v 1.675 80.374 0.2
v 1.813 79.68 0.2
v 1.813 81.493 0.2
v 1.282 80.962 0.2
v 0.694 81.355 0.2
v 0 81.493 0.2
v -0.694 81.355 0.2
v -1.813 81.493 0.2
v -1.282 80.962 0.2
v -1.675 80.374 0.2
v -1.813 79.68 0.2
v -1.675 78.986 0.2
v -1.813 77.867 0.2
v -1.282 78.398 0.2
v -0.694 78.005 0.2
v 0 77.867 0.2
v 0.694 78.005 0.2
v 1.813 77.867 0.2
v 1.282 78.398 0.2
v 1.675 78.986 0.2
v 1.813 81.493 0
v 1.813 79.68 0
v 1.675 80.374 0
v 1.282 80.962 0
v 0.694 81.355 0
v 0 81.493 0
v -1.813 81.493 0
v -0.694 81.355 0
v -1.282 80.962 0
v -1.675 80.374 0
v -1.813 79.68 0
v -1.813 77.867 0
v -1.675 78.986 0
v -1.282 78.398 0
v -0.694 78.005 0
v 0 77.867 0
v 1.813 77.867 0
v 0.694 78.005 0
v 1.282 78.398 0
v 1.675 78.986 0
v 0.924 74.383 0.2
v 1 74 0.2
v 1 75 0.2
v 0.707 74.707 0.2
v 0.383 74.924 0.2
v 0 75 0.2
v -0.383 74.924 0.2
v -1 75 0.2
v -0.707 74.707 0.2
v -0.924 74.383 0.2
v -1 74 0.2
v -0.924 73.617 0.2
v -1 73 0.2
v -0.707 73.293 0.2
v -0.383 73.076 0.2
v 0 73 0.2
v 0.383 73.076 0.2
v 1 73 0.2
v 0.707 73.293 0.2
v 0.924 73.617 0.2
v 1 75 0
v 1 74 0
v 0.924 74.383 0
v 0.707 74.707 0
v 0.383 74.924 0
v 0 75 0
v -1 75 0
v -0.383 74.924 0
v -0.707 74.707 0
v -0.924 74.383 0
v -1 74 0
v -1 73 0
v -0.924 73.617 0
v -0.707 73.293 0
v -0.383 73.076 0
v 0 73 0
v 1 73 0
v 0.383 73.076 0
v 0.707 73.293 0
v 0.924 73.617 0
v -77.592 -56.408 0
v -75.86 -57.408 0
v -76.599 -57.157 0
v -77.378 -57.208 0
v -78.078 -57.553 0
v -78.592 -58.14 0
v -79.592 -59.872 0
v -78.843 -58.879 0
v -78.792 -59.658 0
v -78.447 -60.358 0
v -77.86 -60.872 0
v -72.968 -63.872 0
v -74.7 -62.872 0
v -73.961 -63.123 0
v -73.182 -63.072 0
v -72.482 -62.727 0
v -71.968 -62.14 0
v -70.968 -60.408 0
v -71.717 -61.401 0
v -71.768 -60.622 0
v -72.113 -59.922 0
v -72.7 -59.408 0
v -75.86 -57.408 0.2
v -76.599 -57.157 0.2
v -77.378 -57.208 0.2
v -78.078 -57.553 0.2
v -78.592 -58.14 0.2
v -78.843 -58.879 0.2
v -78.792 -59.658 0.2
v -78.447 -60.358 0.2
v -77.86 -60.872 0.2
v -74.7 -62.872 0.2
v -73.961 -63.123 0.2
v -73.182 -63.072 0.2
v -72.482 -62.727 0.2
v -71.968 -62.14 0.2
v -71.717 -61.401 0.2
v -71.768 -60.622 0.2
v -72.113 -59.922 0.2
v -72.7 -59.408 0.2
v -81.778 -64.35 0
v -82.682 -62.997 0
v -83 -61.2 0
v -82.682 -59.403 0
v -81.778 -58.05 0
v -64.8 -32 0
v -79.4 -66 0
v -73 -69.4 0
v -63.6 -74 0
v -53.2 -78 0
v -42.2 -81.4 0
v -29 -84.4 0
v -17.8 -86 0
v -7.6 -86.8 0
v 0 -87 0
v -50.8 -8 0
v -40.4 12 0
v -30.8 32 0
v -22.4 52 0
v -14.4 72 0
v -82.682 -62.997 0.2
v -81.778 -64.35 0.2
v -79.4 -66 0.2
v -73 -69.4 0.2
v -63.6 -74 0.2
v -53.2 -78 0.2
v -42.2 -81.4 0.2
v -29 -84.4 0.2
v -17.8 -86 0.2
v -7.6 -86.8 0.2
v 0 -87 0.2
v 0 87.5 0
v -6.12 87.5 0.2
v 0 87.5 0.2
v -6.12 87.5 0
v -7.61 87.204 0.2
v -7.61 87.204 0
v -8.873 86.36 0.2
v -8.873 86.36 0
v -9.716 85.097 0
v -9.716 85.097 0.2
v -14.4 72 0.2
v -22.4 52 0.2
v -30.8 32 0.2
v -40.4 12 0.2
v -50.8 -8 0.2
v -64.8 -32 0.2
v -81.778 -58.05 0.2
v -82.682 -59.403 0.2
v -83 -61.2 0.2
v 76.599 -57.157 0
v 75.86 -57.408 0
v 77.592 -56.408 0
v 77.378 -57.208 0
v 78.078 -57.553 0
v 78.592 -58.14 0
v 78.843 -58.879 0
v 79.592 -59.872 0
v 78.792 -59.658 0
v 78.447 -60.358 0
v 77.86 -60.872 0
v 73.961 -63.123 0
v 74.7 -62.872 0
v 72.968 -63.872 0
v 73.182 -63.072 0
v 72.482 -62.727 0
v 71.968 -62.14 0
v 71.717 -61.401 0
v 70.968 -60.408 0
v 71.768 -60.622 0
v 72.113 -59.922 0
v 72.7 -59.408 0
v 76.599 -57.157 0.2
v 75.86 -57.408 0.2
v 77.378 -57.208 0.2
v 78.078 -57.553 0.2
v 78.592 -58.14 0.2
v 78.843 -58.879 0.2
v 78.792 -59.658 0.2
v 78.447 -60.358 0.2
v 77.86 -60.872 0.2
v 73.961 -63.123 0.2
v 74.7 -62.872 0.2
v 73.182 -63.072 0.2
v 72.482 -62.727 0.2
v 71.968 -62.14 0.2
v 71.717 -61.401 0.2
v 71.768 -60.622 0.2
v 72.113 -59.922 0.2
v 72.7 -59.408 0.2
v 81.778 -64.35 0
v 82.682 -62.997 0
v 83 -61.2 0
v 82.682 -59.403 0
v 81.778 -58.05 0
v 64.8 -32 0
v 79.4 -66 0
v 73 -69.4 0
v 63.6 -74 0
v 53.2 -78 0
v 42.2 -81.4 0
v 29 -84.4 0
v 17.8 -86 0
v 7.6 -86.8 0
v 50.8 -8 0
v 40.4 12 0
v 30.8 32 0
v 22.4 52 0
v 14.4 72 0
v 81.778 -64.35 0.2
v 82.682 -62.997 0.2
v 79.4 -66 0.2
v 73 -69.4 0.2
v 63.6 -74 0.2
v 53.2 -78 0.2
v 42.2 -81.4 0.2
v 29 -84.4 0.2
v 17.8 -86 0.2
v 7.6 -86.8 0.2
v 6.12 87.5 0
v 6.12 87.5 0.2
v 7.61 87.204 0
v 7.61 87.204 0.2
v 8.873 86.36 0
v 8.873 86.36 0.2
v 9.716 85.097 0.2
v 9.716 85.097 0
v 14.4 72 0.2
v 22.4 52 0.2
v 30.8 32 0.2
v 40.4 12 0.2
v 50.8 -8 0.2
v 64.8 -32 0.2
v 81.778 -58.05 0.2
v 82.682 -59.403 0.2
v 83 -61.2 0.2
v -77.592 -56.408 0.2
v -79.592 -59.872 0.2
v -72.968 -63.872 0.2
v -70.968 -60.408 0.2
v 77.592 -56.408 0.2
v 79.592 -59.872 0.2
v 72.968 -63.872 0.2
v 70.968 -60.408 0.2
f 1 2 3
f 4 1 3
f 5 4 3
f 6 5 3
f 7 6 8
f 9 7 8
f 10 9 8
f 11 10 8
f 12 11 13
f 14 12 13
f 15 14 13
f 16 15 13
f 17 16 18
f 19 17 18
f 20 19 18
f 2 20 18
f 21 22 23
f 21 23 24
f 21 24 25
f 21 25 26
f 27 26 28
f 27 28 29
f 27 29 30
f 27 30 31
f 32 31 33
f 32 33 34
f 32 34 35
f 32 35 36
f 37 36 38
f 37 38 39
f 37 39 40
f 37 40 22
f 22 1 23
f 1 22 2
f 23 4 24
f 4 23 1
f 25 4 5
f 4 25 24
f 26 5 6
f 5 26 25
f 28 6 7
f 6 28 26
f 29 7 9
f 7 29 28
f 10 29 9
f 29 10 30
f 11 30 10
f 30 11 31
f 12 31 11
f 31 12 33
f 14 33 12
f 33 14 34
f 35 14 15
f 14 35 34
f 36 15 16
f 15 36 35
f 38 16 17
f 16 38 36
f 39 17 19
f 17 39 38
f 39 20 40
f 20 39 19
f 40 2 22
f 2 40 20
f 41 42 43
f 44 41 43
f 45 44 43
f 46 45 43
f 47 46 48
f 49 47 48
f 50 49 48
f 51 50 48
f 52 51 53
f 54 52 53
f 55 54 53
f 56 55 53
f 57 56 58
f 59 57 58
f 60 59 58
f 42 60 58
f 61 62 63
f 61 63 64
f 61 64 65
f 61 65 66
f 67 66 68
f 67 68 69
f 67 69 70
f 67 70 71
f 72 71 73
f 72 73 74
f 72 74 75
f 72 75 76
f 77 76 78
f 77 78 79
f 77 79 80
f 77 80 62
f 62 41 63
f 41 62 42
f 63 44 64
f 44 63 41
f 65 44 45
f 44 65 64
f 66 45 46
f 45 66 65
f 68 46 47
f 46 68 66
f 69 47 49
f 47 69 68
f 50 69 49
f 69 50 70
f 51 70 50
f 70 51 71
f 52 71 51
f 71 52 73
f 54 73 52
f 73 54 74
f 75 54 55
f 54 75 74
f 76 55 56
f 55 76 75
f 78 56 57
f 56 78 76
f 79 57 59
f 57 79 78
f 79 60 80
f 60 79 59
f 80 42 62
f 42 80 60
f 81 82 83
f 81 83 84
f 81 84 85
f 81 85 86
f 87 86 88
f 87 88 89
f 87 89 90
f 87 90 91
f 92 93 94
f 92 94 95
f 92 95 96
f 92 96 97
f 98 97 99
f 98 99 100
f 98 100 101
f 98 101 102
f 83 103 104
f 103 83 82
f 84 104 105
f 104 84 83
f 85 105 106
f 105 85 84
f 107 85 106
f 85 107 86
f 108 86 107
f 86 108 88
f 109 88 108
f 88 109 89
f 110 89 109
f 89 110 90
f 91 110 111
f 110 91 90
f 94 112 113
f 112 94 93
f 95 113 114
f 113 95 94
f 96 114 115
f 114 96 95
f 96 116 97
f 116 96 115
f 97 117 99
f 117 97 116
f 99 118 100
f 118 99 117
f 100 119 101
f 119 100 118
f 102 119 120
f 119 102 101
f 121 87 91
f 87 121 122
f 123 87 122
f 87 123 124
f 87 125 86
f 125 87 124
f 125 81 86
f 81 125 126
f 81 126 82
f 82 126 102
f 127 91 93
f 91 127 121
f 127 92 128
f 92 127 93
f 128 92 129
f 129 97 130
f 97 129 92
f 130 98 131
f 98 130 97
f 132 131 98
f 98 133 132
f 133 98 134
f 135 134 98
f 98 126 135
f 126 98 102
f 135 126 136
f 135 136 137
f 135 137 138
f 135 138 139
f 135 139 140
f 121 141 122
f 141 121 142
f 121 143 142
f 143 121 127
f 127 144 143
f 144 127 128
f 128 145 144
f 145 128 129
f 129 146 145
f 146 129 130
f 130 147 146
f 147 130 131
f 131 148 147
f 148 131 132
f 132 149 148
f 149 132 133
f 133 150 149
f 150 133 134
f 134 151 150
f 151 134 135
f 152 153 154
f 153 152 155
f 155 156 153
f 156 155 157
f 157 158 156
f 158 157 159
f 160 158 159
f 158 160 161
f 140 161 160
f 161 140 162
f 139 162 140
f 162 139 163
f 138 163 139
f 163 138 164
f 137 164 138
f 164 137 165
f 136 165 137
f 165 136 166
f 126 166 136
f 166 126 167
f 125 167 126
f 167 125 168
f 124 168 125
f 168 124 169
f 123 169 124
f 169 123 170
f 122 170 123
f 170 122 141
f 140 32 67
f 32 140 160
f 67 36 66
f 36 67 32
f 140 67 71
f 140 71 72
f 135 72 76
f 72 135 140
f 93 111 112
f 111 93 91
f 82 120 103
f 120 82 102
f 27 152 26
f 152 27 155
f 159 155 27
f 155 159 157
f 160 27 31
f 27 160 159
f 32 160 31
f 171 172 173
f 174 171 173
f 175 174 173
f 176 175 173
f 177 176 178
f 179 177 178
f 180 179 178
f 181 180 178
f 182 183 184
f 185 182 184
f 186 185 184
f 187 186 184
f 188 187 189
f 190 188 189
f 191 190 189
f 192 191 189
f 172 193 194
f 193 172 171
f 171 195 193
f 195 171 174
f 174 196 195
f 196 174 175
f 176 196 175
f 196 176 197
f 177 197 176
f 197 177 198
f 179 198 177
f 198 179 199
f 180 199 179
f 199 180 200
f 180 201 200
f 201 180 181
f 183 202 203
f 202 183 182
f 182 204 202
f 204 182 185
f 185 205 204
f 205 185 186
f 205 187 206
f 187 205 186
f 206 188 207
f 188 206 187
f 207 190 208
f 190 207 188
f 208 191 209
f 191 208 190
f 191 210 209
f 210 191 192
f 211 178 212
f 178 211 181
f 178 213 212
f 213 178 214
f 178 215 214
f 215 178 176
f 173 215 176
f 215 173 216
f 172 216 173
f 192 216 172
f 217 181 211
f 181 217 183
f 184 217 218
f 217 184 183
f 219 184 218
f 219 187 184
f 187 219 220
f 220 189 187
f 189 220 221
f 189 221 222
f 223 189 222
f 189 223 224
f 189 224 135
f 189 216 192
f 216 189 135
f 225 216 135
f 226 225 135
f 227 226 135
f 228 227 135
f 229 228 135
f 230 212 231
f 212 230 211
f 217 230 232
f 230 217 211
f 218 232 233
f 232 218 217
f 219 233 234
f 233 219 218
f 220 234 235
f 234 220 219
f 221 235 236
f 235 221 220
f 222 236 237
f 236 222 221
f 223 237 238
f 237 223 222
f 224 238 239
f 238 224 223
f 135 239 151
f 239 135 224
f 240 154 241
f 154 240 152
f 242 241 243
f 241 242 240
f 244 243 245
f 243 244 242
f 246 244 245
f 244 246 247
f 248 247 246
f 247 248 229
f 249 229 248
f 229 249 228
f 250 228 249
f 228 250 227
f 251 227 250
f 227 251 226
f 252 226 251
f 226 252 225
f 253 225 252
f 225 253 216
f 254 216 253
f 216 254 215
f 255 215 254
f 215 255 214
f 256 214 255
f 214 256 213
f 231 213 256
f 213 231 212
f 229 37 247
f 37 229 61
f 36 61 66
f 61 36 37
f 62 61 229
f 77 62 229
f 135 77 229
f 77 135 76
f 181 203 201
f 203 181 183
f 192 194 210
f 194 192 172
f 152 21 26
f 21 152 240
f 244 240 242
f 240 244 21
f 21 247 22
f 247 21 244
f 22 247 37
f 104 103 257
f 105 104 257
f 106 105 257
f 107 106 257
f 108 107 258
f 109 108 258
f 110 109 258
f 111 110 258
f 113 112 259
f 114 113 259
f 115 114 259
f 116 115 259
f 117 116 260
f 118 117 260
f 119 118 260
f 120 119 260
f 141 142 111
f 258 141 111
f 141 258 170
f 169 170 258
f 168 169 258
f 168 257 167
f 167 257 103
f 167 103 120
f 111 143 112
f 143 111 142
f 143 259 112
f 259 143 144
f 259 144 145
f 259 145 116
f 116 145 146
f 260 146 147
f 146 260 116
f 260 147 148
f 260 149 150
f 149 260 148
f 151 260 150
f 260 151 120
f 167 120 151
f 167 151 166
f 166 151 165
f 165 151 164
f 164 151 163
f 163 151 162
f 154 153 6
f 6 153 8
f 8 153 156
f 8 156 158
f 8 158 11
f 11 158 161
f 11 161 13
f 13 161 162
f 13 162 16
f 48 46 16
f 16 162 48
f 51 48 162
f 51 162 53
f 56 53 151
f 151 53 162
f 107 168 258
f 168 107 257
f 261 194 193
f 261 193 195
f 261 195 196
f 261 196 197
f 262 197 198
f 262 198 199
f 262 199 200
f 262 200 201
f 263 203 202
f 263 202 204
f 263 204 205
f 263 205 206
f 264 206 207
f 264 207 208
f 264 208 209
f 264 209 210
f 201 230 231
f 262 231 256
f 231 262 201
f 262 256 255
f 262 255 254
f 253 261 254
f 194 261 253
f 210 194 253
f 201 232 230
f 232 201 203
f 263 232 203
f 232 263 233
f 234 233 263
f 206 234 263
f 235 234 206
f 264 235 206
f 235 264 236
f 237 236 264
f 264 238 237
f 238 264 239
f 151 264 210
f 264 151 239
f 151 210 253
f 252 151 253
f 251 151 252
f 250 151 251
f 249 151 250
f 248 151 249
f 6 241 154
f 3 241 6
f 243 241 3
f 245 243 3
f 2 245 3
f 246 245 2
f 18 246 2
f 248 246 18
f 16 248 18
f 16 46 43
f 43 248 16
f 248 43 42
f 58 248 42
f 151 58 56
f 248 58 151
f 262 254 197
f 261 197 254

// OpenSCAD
// file: ../p/2-4edge.scad
use <../lib.scad>
function ldraw_lib__2_4edge() = [
// 0 Circle 0.5
// 0 Name: 2-4edge.dat
// 0 Author: James Jessiman
// 0 !LDRAW_ORG Primitive UPDATE 2017-01
// 0 !LICENSE Licensed under CC BY 4.0 : see CAreadme.txt
// 
// 0 BFC CERTIFY CCW
  [0,"BFC","CERTIFY"],
  [0,"BFC","CCW"],
// 
// 0 !HISTORY 2007-06-24 [PTadmin] Header formatted for Contributor Agreement
// 0 !HISTORY 2008-07-01 [PTadmin] Official Update 2008-01
// 0 !HISTORY 2017-01-15 [Steffen] BFCed
// 0 !HISTORY 2017-12-30 [PTadmin] Official Update 2017-01
// 
// 
// 2 24 1 0 0 0.9239 0 0.3827
  [2,24,1,0,0,0.9239,0,0.3827],
// 2 24 0.9239 0 0.3827 0.7071 0 0.7071
  [2,24,0.9239,0,0.3827,0.7071,0,0.7071],
// 2 24 0.7071 0 0.7071 0.3827 0 0.9239
  [2,24,0.7071,0,0.7071,0.3827,0,0.9239],
// 2 24 0.3827 0 0.9239 0 0 1
  [2,24,0.3827,0,0.9239,0,0,1],
// 2 24 0 0 1 -0.3827 0 0.9239
  [2,24,0,0,1,-0.3827,0,0.9239],
// 2 24 -0.3827 0 0.9239 -0.7071 0 0.7071
  [2,24,-0.3827,0,0.9239,-0.7071,0,0.7071],
// 2 24 -0.7071 0 0.7071 -0.9239 0 0.3827
  [2,24,-0.7071,0,0.7071,-0.9239,0,0.3827],
// 2 24 -0.9239 0 0.3827 -1 0 0
  [2,24,-0.9239,0,0.3827,-1,0,0],
];
module ldraw_lib__2_4edge(step=0, col=false, unit=2/5, alt=false, line=0.2, solid=!$preview)
    makepoly(ldraw_lib__2_4edge(), step=step, col=col, unit=unit, alt=alt, line=line, solid=solid);
ldraw_lib__2_4edge(line=0.2);
// file: ../p/2-4cyli.scad
use <../lib.scad>
function ldraw_lib__2_4cyli() = [
// 0 Cylinder 0.5
// 0 Name: 2-4cyli.dat
// 0 Author: James Jessiman
// 0 !LDRAW_ORG Primitive UPDATE 2005-01
// 0 !LICENSE Licensed under CC BY 4.0 : see CAreadme.txt
// 
// 0 BFC CERTIFY CCW
  [0,"BFC","CERTIFY"],
  [0,"BFC","CCW"],
// 
// 0 !HISTORY 2002-03-23 [sbliss] Added BFC statement; compacted code
// 0 !HISTORY 2002-04-25 [PTadmin] Official Update 2002-02
// 0 !HISTORY 2004-12-11 [nielsk] Recreated using Primitive Generator, Edge lines fixed, BFC changed to CCW
// 0 !HISTORY 2005-12-28 [PTadmin] Official Update 2005-01
// 0 !HISTORY 2007-06-24 [PTadmin] Header formatted for Contributor Agreement
// 0 !HISTORY 2008-07-01 [PTadmin] Official Update 2008-01
// 
// 
// 4 16 .9239 1 .3827 .9239 0 .3827 1 0 0 1 1 0
  [4,16,.9239,1,.3827,.9239,0,.3827,1,0,0,1,1,0],
// 4 16 .7071 1 .7071 .7071 0 .7071 .9239 0 .3827 .9239 1 .3827
  [4,16,.7071,1,.7071,.7071,0,.7071,.9239,0,.3827,.9239,1,.3827],
// 4 16 .3827 1 .9239 .3827 0 .9239 .7071 0 .7071 .7071 1 .7071
  [4,16,.3827,1,.9239,.3827,0,.9239,.7071,0,.7071,.7071,1,.7071],
// 4 16 0 1 1 0 0 1 .3827 0 .9239 .3827 1 .9239
  [4,16,0,1,1,0,0,1,.3827,0,.9239,.3827,1,.9239],
// 4 16 -.3827 1 .9239 -.3827 0 .9239 0 0 1 0 1 1
  [4,16,-.3827,1,.9239,-.3827,0,.9239,0,0,1,0,1,1],
// 4 16 -.7071 1 .7071 -.7071 0 .7071 -.3827 0 .9239 -.3827 1 .9239
  [4,16,-.7071,1,.7071,-.7071,0,.7071,-.3827,0,.9239,-.3827,1,.9239],
// 4 16 -.9239 1 .3827 -.9239 0 .3827 -.7071 0 .7071 -.7071 1 .7071
  [4,16,-.9239,1,.3827,-.9239,0,.3827,-.7071,0,.7071,-.7071,1,.7071],
// 4 16 -1 1 0 -1 0 0 -.9239 0 .3827 -.9239 1 .3827
  [4,16,-1,1,0,-1,0,0,-.9239,0,.3827,-.9239,1,.3827],
// 5 24 1 1 0 1 0 0 1 1 -.4142 .9239 1 .3827
  [5,24,1,1,0,1,0,0,1,1,-.4142,.9239,1,.3827],
// 5 24 .9239 1 .3827 .9239 0 .3827 1 1 0 .7071 1 .7071
  [5,24,.9239,1,.3827,.9239,0,.3827,1,1,0,.7071,1,.7071],
// 5 24 .7071 1 .7071 .7071 0 .7071 .9239 1 .3827 .3827 1 .9239
  [5,24,.7071,1,.7071,.7071,0,.7071,.9239,1,.3827,.3827,1,.9239],
// 5 24 .3827 1 .9239 .3827 0 .9239 .7071 1 .7071 0 1 1
  [5,24,.3827,1,.9239,.3827,0,.9239,.7071,1,.7071,0,1,1],
// 5 24 0 1 1 0 0 1 .3827 1 .9239 -.3827 1 .9239
  [5,24,0,1,1,0,0,1,.3827,1,.9239,-.3827,1,.9239],
// 5 24 -.3827 1 .9239 -.3827 0 .9239 0 1 1 -.7071 1 .7071
  [5,24,-.3827,1,.9239,-.3827,0,.9239,0,1,1,-.7071,1,.7071],
// 5 24 -.7071 1 .7071 -.7071 0 .7071 -.3827 1 .9239 -.9239 1 .3827
  [5,24,-.7071,1,.7071,-.7071,0,.7071,-.3827,1,.9239,-.9239,1,.3827],
// 5 24 -.9239 1 .3827 -.9239 0 .3827 -.7071 1 .7071 -1 1 0
  [5,24,-.9239,1,.3827,-.9239,0,.3827,-.7071,1,.7071,-1,1,0],
// 5 24 -1 1 0 -1 0 0 -.9239 1 .3827 -1 1 -.4142
  [5,24,-1,1,0,-1,0,0,-.9239,1,.3827,-1,1,-.4142],
// 0
];
module ldraw_lib__2_4cyli(step=0, col=false, unit=2/5, alt=false, line=0.2, solid=!$preview)
    makepoly(ldraw_lib__2_4cyli(), step=step, col=col, unit=unit, alt=alt, line=line, solid=solid);
ldraw_lib__2_4cyli(line=0.2);
// file: ../p/2-4ndis.scad
use <../lib.scad>
function ldraw_lib__2_4ndis() = [
// 0 Disc Negative 0.5
// 0 Name: 2-4ndis.dat
// 0 Author: James Jessiman
// 0 !LDRAW_ORG Primitive UPDATE 2012-01
// 0 !LICENSE Licensed under CC BY 4.0 : see CAreadme.txt
// 
// 0 BFC CERTIFY CCW
  [0,"BFC","CERTIFY"],
  [0,"BFC","CCW"],
// 
// 0 !HISTORY 2002-03-23 [sbliss] Added BFC statement; compacted code
// 0 !HISTORY 2002-04-25 [PTadmin] Official Update 2002-02
// 0 !HISTORY 2007-06-24 [PTadmin] Header formatted for Contributor Agreement
// 0 !HISTORY 2008-07-01 [PTadmin] Official Update 2008-01
// 0 !HISTORY 2012-02-16 [Philo] Changed to CCW
// 0 !HISTORY 2012-03-30 [PTadmin] Official Update 2012-01
// 
// 
// 3 16 0.9239 0 0.3827 1 0 0 1 0 1
  [3,16,0.9239,0,0.3827,1,0,0,1,0,1],
// 3 16 0.7071 0 0.7071 0.9239 0 0.3827 1 0 1
  [3,16,0.7071,0,0.7071,0.9239,0,0.3827,1,0,1],
// 3 16 0.3827 0 0.9239 0.7071 0 0.7071 1 0 1
  [3,16,0.3827,0,0.9239,0.7071,0,0.7071,1,0,1],
// 3 16 0 0 1 0.3827 0 0.9239 1 0 1
  [3,16,0,0,1,0.3827,0,0.9239,1,0,1],
// 3 16 -0.3827 0 0.9239 0 0 1 -1 0 1
  [3,16,-0.3827,0,0.9239,0,0,1,-1,0,1],
// 3 16 -0.7071 0 0.7071 -0.3827 0 0.9239 -1 0 1
  [3,16,-0.7071,0,0.7071,-0.3827,0,0.9239,-1,0,1],
// 3 16 -0.9239 0 0.3827 -0.7071 0 0.7071 -1 0 1
  [3,16,-0.9239,0,0.3827,-0.7071,0,0.7071,-1,0,1],
// 3 16 -1 0 0 -0.9239 0 0.3827 -1 0 1
  [3,16,-1,0,0,-0.9239,0,0.3827,-1,0,1],
];
module ldraw_lib__2_4ndis(step=0, col=false, unit=2/5, alt=false, line=0.2, solid=!$preview)
    makepoly(ldraw_lib__2_4ndis(), step=step, col=col, unit=unit, alt=alt, line=line, solid=solid);
ldraw_lib__2_4ndis(line=0.2);
// file: ../p/2-4cylo.scad
use <../lib.scad>
use <2-4cyli.scad>
use <2-4edge.scad>
function ldraw_lib__2_4cylo() = [
// 0 Cylinder Open 0.5
// 0 Name: 2-4cylo.dat
// 0 Author: Max Martin Richter [MMR1988]
// 0 !LDRAW_ORG Primitive UPDATE 2010-03
// 0 !LICENSE Licensed under CC BY 4.0 : see CAreadme.txt
// 
// 0 BFC CERTIFY CCW
  [0,"BFC","CERTIFY"],
  [0,"BFC","CCW"],
// 
// 0 !HISTORY 2010-12-31 [PTadmin] Official Update 2010-03
// 
// 
// 1 16 0 0 0 1 0 0 0 1 0 0 0 1 2-4edge.dat
  [1,16,0,0,0,1,0,0,0,1,0,0,0,1, ldraw_lib__2_4edge()],
// 1 16 0 1 0 1 0 0 0 1 0 0 0 1 2-4edge.dat
  [1,16,0,1,0,1,0,0,0,1,0,0,0,1, ldraw_lib__2_4edge()],
// 1 16 0 0 0 1 0 0 0 1 0 0 0 1 2-4cyli.dat
  [1,16,0,0,0,1,0,0,0,1,0,0,0,1, ldraw_lib__2_4cyli()],
];
module ldraw_lib__2_4cylo(step=0, col=false, unit=2/5, alt=false, line=0.2, solid=!$preview)
    makepoly(ldraw_lib__2_4cylo(), step=step, col=col, unit=unit, alt=alt, line=line, solid=solid);
ldraw_lib__2_4cylo(line=0.2);
// file: ../p/4-4edge.scad
use <../lib.scad>
function ldraw_lib__4_4edge() = [
// 0 Circle 1.0
// 0 Name: 4-4edge.dat
// 0 Author: James Jessiman
// 0 !LDRAW_ORG Primitive UPDATE 2017-01
// 0 !LICENSE Licensed under CC BY 4.0 : see CAreadme.txt
// 
// 0 BFC CERTIFY CCW
  [0,"BFC","CERTIFY"],
  [0,"BFC","CCW"],
// 
// 0 !HISTORY 1998-12-15 [PTadmin] Official Update 1998-10
// 0 !HISTORY 2005-12-28 [PTadmin] Official Update 2005-01
// 0 !HISTORY 2007-06-24 [PTadmin] Header formatted for Contributor Agreement
// 0 !HISTORY 2008-07-01 [PTadmin] Official Update 2008-01
// 0 !HISTORY 2017-01-15 [Steffen] BFCed
// 0 !HISTORY 2017-12-30 [PTadmin] Official Update 2017-01
// 
// 
// 2 24 1 0 0 0.9239 0 0.3827
  [2,24,1,0,0,0.9239,0,0.3827],
// 2 24 0.9239 0 0.3827 0.7071 0 0.7071
  [2,24,0.9239,0,0.3827,0.7071,0,0.7071],
// 2 24 0.7071 0 0.7071 0.3827 0 0.9239
  [2,24,0.7071,0,0.7071,0.3827,0,0.9239],
// 2 24 0.3827 0 0.9239 0 0 1
  [2,24,0.3827,0,0.9239,0,0,1],
// 2 24 0 0 1 -0.3827 0 0.9239
  [2,24,0,0,1,-0.3827,0,0.9239],
// 2 24 -0.3827 0 0.9239 -0.7071 0 0.7071
  [2,24,-0.3827,0,0.9239,-0.7071,0,0.7071],
// 2 24 -0.7071 0 0.7071 -0.9239 0 0.3827
  [2,24,-0.7071,0,0.7071,-0.9239,0,0.3827],
// 2 24 -0.9239 0 0.3827 -1 0 -0
  [2,24,-0.9239,0,0.3827,-1,0,-0],
// 2 24 -1 0 -0 -0.9239 0 -0.3827
  [2,24,-1,0,-0,-0.9239,0,-0.3827],
// 2 24 -0.9239 0 -0.3827 -0.7071 0 -0.7071
  [2,24,-0.9239,0,-0.3827,-0.7071,0,-0.7071],
// 2 24 -0.7071 0 -0.7071 -0.3827 0 -0.9239
  [2,24,-0.7071,0,-0.7071,-0.3827,0,-0.9239],
// 2 24 -0.3827 0 -0.9239 0 0 -1
  [2,24,-0.3827,0,-0.9239,0,0,-1],
// 2 24 0 0 -1 0.3827 0 -0.9239
  [2,24,0,0,-1,0.3827,0,-0.9239],
// 2 24 0.3827 0 -0.9239 0.7071 0 -0.7071
  [2,24,0.3827,0,-0.9239,0.7071,0,-0.7071],
// 2 24 0.7071 0 -0.7071 0.9239 0 -0.3827
  [2,24,0.7071,0,-0.7071,0.9239,0,-0.3827],
// 2 24 0.9239 0 -0.3827 1 0 0
  [2,24,0.9239,0,-0.3827,1,0,0],
];
module ldraw_lib__4_4edge(step=0, col=false, unit=2/5, alt=false, line=0.2, solid=!$preview)
    makepoly(ldraw_lib__4_4edge(), step=step, col=col, unit=unit, alt=alt, line=line, solid=solid);
ldraw_lib__4_4edge(line=0.2);
// file: ../p/4-4cyli.scad
use <../lib.scad>
function ldraw_lib__4_4cyli() = [
// 0 Cylinder 1.0
// 0 Name: 4-4cyli.dat
// 0 Author: James Jessiman
// 0 !LDRAW_ORG Primitive UPDATE 2005-01
// 0 !LICENSE Licensed under CC BY 4.0 : see CAreadme.txt
// 
// 0 BFC CERTIFY CCW
  [0,"BFC","CERTIFY"],
  [0,"BFC","CCW"],
// 
// 0 !HISTORY 1998-12-15 [PTadmin] Official Update 1998-10
// 0 !HISTORY 2002-03-23 [sbliss] Added BFC statement; merged headers from files in distributions LDraw 0.27 and Complete.
// 0 !HISTORY 2002-04-25 [PTadmin] Official Update 2002-02
// 0 !HISTORY 2004-12-14 [guyvivan] BFC CCW
// 0 !HISTORY 2005-12-28 [PTadmin] Official Update 2005-01
// 0 !HISTORY 2007-06-24 [PTadmin] Header formatted for Contributor Agreement
// 0 !HISTORY 2008-07-01 [PTadmin] Official Update 2008-01
// 
// 
// 4 16 1 1 0 0.9239 1 0.3827 0.9239 0 0.3827 1 0 0
  [4,16,1,1,0,0.9239,1,0.3827,0.9239,0,0.3827,1,0,0],
// 5 24 1 0 0 1 1 0 0.9239 0 0.3827 0.9239 0 -0.3827
  [5,24,1,0,0,1,1,0,0.9239,0,0.3827,0.9239,0,-0.3827],
// 4 16 0.9239 1 0.3827 0.7071 1 0.7071 0.7071 0 0.7071 0.9239 0 0.3827
  [4,16,0.9239,1,0.3827,0.7071,1,0.7071,0.7071,0,0.7071,0.9239,0,0.3827],
// 5 24 0.9239 0 0.3827 0.9239 1 0.3827 0.7071 0 0.7071 1 0 0
  [5,24,0.9239,0,0.3827,0.9239,1,0.3827,0.7071,0,0.7071,1,0,0],
// 4 16 0.7071 1 0.7071 0.3827 1 0.9239 0.3827 0 0.9239 0.7071 0 0.7071
  [4,16,0.7071,1,0.7071,0.3827,1,0.9239,0.3827,0,0.9239,0.7071,0,0.7071],
// 5 24 0.7071 0 0.7071 0.7071 1 0.7071 0.3827 0 0.9239 0.9239 0 0.3827
  [5,24,0.7071,0,0.7071,0.7071,1,0.7071,0.3827,0,0.9239,0.9239,0,0.3827],
// 4 16 0.3827 1 0.9239 0 1 1 0 0 1 0.3827 0 0.9239
  [4,16,0.3827,1,0.9239,0,1,1,0,0,1,0.3827,0,0.9239],
// 5 24 0.3827 0 0.9239 0.3827 1 0.9239 0 0 1 0.7071 0 0.7071
  [5,24,0.3827,0,0.9239,0.3827,1,0.9239,0,0,1,0.7071,0,0.7071],
// 4 16 0 1 1 -0.3827 1 0.9239 -0.3827 0 0.9239 0 0 1
  [4,16,0,1,1,-0.3827,1,0.9239,-0.3827,0,0.9239,0,0,1],
// 5 24 0 0 1 0 1 1 -0.3827 0 0.9239 0.3827 0 0.9239
  [5,24,0,0,1,0,1,1,-0.3827,0,0.9239,0.3827,0,0.9239],
// 4 16 -0.3827 1 0.9239 -0.7071 1 0.7071 -0.7071 0 0.7071 -0.3827 0 0.9239
  [4,16,-0.3827,1,0.9239,-0.7071,1,0.7071,-0.7071,0,0.7071,-0.3827,0,0.9239],
// 5 24 -0.3827 0 0.9239 -0.3827 1 0.9239 -0.7071 0 0.7071 0 0 1
  [5,24,-0.3827,0,0.9239,-0.3827,1,0.9239,-0.7071,0,0.7071,0,0,1],
// 4 16 -0.7071 1 0.7071 -0.9239 1 0.3827 -0.9239 0 0.3827 -0.7071 0 0.7071
  [4,16,-0.7071,1,0.7071,-0.9239,1,0.3827,-0.9239,0,0.3827,-0.7071,0,0.7071],
// 5 24 -0.7071 0 0.7071 -0.7071 1 0.7071 -0.9239 0 0.3827 -0.3827 0 0.9239
  [5,24,-0.7071,0,0.7071,-0.7071,1,0.7071,-0.9239,0,0.3827,-0.3827,0,0.9239],
// 4 16 -0.9239 1 0.3827 -1 1 0 -1 0 0 -0.9239 0 0.3827
  [4,16,-0.9239,1,0.3827,-1,1,0,-1,0,0,-0.9239,0,0.3827],
// 5 24 -0.9239 0 0.3827 -0.9239 1 0.3827 -1 0 0 -0.7071 0 0.7071
  [5,24,-0.9239,0,0.3827,-0.9239,1,0.3827,-1,0,0,-0.7071,0,0.7071],
// 4 16 -1 1 0 -0.9239 1 -0.3827 -0.9239 0 -0.3827 -1 0 0
  [4,16,-1,1,0,-0.9239,1,-0.3827,-0.9239,0,-0.3827,-1,0,0],
// 5 24 -1 0 0 -1 1 0 -0.9239 0 -0.3827 -0.9239 0 0.3827
  [5,24,-1,0,0,-1,1,0,-0.9239,0,-0.3827,-0.9239,0,0.3827],
// 4 16 -0.9239 1 -0.3827 -0.7071 1 -0.7071 -0.7071 0 -0.7071 -0.9239 0 -0.3827
  [4,16,-0.9239,1,-0.3827,-0.7071,1,-0.7071,-0.7071,0,-0.7071,-0.9239,0,-0.3827],
// 5 24 -0.9239 0 -0.3827 -0.9239 1 -0.3827 -0.7071 0 -0.7071 -1 0 0
  [5,24,-0.9239,0,-0.3827,-0.9239,1,-0.3827,-0.7071,0,-0.7071,-1,0,0],
// 4 16 -0.7071 1 -0.7071 -0.3827 1 -0.9239 -0.3827 0 -0.9239 -0.7071 0 -0.7071
  [4,16,-0.7071,1,-0.7071,-0.3827,1,-0.9239,-0.3827,0,-0.9239,-0.7071,0,-0.7071],
// 5 24 -0.7071 0 -0.7071 -0.7071 1 -0.7071 -0.3827 0 -0.9239 -0.9239 0 -0.3827
  [5,24,-0.7071,0,-0.7071,-0.7071,1,-0.7071,-0.3827,0,-0.9239,-0.9239,0,-0.3827],
// 4 16 -0.3827 1 -0.9239 0 1 -1 0 0 -1 -0.3827 0 -0.9239
  [4,16,-0.3827,1,-0.9239,0,1,-1,0,0,-1,-0.3827,0,-0.9239],
// 5 24 -0.3827 0 -0.9239 -0.3827 1 -0.9239 0 0 -1 -0.7071 0 -0.7071
  [5,24,-0.3827,0,-0.9239,-0.3827,1,-0.9239,0,0,-1,-0.7071,0,-0.7071],
// 4 16 0 1 -1 0.3827 1 -0.9239 0.3827 0 -0.9239 0 0 -1
  [4,16,0,1,-1,0.3827,1,-0.9239,0.3827,0,-0.9239,0,0,-1],
// 5 24 0 0 -1 0 1 -1 0.3827 0 -0.9239 -0.3827 0 -0.9239
  [5,24,0,0,-1,0,1,-1,0.3827,0,-0.9239,-0.3827,0,-0.9239],
// 4 16 0.3827 1 -0.9239 0.7071 1 -0.7071 0.7071 0 -0.7071 0.3827 0 -0.9239
  [4,16,0.3827,1,-0.9239,0.7071,1,-0.7071,0.7071,0,-0.7071,0.3827,0,-0.9239],
// 5 24 0.3827 0 -0.9239 0.3827 1 -0.9239 0.7071 0 -0.7071 0 0 -1
  [5,24,0.3827,0,-0.9239,0.3827,1,-0.9239,0.7071,0,-0.7071,0,0,-1],
// 4 16 0.7071 1 -0.7071 0.9239 1 -0.3827 0.9239 0 -0.3827 0.7071 0 -0.7071
  [4,16,0.7071,1,-0.7071,0.9239,1,-0.3827,0.9239,0,-0.3827,0.7071,0,-0.7071],
// 5 24 0.7071 0 -0.7071 0.7071 1 -0.7071 0.9239 0 -0.3827 0.3827 0 -0.9239
  [5,24,0.7071,0,-0.7071,0.7071,1,-0.7071,0.9239,0,-0.3827,0.3827,0,-0.9239],
// 4 16 0.9239 1 -0.3827 1 1 0 1 0 0 0.9239 0 -0.3827
  [4,16,0.9239,1,-0.3827,1,1,0,1,0,0,0.9239,0,-0.3827],
// 5 24 0.9239 0 -0.3827 0.9239 1 -0.3827 1 0 0 0.7071 0 -0.7071
  [5,24,0.9239,0,-0.3827,0.9239,1,-0.3827,1,0,0,0.7071,0,-0.7071],
// 0
];
module ldraw_lib__4_4cyli(step=0, col=false, unit=2/5, alt=false, line=0.2, solid=!$preview)
    makepoly(ldraw_lib__4_4cyli(), step=step, col=col, unit=unit, alt=alt, line=line, solid=solid);
ldraw_lib__4_4cyli(line=0.2);
// file: s/32939s02.scad
use <../../lib.scad>
use <../../p/2-4ndis.scad>
function ldraw_lib__s__32939s02() = [
// 0 ~Sheet Fabric Triangular 21.8 x 20.7 with Curved Sides and  4 Holes - Half Top Surface
// 0 Name: s\32939s02.dat
// 0 Author: Evert-Jan Boer [ejboer]
// 0 !LDRAW_ORG Subpart UPDATE 2026-09
// 0 !LICENSE Licensed under CC BY 4.0 : see CAreadme.txt
// 
// 0 BFC CERTIFY CCW
  [0,"BFC","CERTIFY"],
  [0,"BFC","CCW"],
// 
// 0 !HISTORY 2026-09-30 [OrionP] Official Update 2026-09
// 
// 1 16 -192.15 0 -147.85 2.5 0 -4.3301 0 1 0 4.3301 0 2.5 2-4ndis.dat
  [1,16,-192.15,0,-147.85,2.5,0,-4.3301,0,1,0,4.3301,0,2.5, ldraw_lib__2_4ndis()],
// 1 16 -184.25 0 -152.85 -2.5 0 4.3301 0 1 0 -4.3301 0 -2.5 2-4ndis.dat
  [1,16,-184.25,0,-152.85,-2.5,0,4.3301,0,1,0,-4.3301,0,-2.5, ldraw_lib__2_4ndis()],
// 
// 3 16 -206.706 0 -157.492 -204.445 0 -160.876 -194.65 0 -152.1801
  [3,16,-206.706,0,-157.492,-204.445,0,-160.876,-194.65,0,-152.1801],
// 4 16 -207.5 0 -153 -206.706 0 -157.492 -194.65 0 -152.1801 -198.9801 0 -149.6801
  [4,16,-207.5,0,-153,-206.706,0,-157.492,-194.65,0,-152.1801,-198.9801,0,-149.6801],
// 3 16 -206.706 0 -148.508 -207.5 0 -153 -198.9801 0 -149.6801
  [3,16,-206.706,0,-148.508,-207.5,0,-153,-198.9801,0,-149.6801],
// 3 16 -204.445 0 -145.124 -206.706 0 -148.508 -198.9801 0 -149.6801
  [3,16,-204.445,0,-145.124,-206.706,0,-148.508,-198.9801,0,-149.6801],
// 3 16 -204.445 0 -145.124 -193.9801 0 -141.0199 -162 0 -80
  [3,16,-204.445,0,-145.124,-193.9801,0,-141.0199,-162,0,-80],
// 3 16 -162 0 -80 -193.9801 0 -141.0199 -189.65 0 -143.5199
  [3,16,-162,0,-80,-193.9801,0,-141.0199,-189.65,0,-143.5199],
// 3 16 -162 0 -80 -189.65 0 -143.5199 -181.75 0 -148.5199
  [3,16,-162,0,-80,-189.65,0,-143.5199,-181.75,0,-148.5199],
// 4 16 -186.75 0 -157.1801 -194.65 0 -152.1801 -204.445 0 -160.876 -198.5 0 -165
  [4,16,-186.75,0,-157.1801,-194.65,0,-152.1801,-204.445,0,-160.876,-198.5,0,-165],
// 4 16 -182.4199 0 -159.6801 -186.75 0 -157.1801 -198.5 0 -165 -182.5 0 -173.5
  [4,16,-182.4199,0,-159.6801,-186.75,0,-157.1801,-198.5,0,-165,-182.5,0,-173.5],
// 3 16 -182.4199 0 -159.6801 -182.5 0 -173.5 -159 0 -185
  [3,16,-182.4199,0,-159.6801,-182.5,0,-173.5,-159,0,-185],
// 3 16 -182.4199 0 -159.6801 -159 0 -185 -179.9199 0 -155.35
  [3,16,-182.4199,0,-159.6801,-159,0,-185,-179.9199,0,-155.35],
// 3 16 -179.9199 0 -155.35 -159 0 -185 -133 0 -195
  [3,16,-179.9199,0,-155.35,-159,0,-185,-133,0,-195],
// 4 16 -177.4199 0 -151.0199 -179.9199 0 -155.35 -133 0 -195 -105.5 0 -203.5
  [4,16,-177.4199,0,-151.0199,-179.9199,0,-155.35,-133,0,-195,-105.5,0,-203.5],
// 3 16 -177.4199 0 -151.0199 -105.5 0 -203.5 -72.5 0 -211
  [3,16,-177.4199,0,-151.0199,-105.5,0,-203.5,-72.5,0,-211],
// 4 16 -177.4199 0 -151.0199 -72.5 0 -211 -44.5 0 -215 -19 0 -217
  [4,16,-177.4199,0,-151.0199,-72.5,0,-211,-44.5,0,-215,-19,0,-217],
// 4 16 -177.4199 0 -151.0199 -19 0 -217 0 0 -217.5 -181.75 0 -148.5199
  [4,16,-177.4199,0,-151.0199,-19,0,-217,0,0,-217.5,-181.75,0,-148.5199],
// 3 16 -162 0 -80 -181.75 0 -148.5199 0 0 -217.5
  [3,16,-162,0,-80,-181.75,0,-148.5199,0,0,-217.5],
// 3 16 -162 0 -80 0 0 -217.5 -127 0 -20
  [3,16,-162,0,-80,0,0,-217.5,-127,0,-20],
// 3 16 -127 0 -20 0 0 -217.5 -101 0 30
  [3,16,-127,0,-20,0,0,-217.5,-101,0,30],
// 3 16 -101 0 30 0 0 -217.5 -77 0 80
  [3,16,-101,0,30,0,0,-217.5,-77,0,80],
// 3 16 -77 0 80 0 0 -217.5 -56 0 130
  [3,16,-77,0,80,0,0,-217.5,-56,0,130],
// 3 16 -56 0 130 0 0 -217.5 -36 0 180
  [3,16,-56,0,130,0,0,-217.5,-36,0,180],
// 3 16 0 0 218.75 -15.3 0 218.75 0 0 203.733
  [3,16,0,0,218.75,-15.3,0,218.75,0,0,203.733],
// 3 16 0 0 203.733 -15.3 0 218.75 -4.533 0 203.733
  [3,16,0,0,203.733,-15.3,0,218.75,-4.533,0,203.733],
// 3 16 -4.533 0 203.733 -15.3 0 218.75 -19.024 0 218.009
  [3,16,-4.533,0,203.733,-15.3,0,218.75,-19.024,0,218.009],
// 3 16 -4.533 0 203.733 -19.024 0 218.009 -22.182 0 215.9
  [3,16,-4.533,0,203.733,-19.024,0,218.009,-22.182,0,215.9],
// 3 16 -4.533 0 203.733 -22.182 0 215.9 -4.533 0 199.2
  [3,16,-4.533,0,203.733,-22.182,0,215.9,-4.533,0,199.2],
// 3 16 -4.533 0 199.2 -22.182 0 215.9 -24.291 0 212.742
  [3,16,-4.533,0,199.2,-22.182,0,215.9,-24.291,0,212.742],
// 3 16 -4.533 0 199.2 -24.291 0 212.742 -4.533 0 194.667
  [3,16,-4.533,0,199.2,-24.291,0,212.742,-4.533,0,194.667],
// 3 16 -4.533 0 194.667 -24.291 0 212.742 -36 0 180
  [3,16,-4.533,0,194.667,-24.291,0,212.742,-36,0,180],
// 3 16 -4.533 0 194.667 -36 0 180 0 0 194.667
  [3,16,-4.533,0,194.667,-36,0,180,0,0,194.667],
// 3 16 -2.5 0 187.5 0 0 187.5 0 0 194.667
  [3,16,-2.5,0,187.5,0,0,187.5,0,0,194.667],
// 3 16 0 0 194.667 -36 0 180 -2.5 0 187.5
  [3,16,0,0,194.667,-36,0,180,-2.5,0,187.5],
// 3 16 -2.5 0 185 -2.5 0 187.5 -36 0 180
  [3,16,-2.5,0,185,-2.5,0,187.5,-36,0,180],
// 3 16 -2.5 0 185 -36 0 180 -2.5 0 182.5
  [3,16,-2.5,0,185,-36,0,180,-2.5,0,182.5],
// 3 16 0 0 182.5 -2.5 0 182.5 0 0 -217.5
  [3,16,0,0,182.5,-2.5,0,182.5,0,0,-217.5],
// 3 16 0 0 -217.5 -2.5 0 182.5 -36 0 180
  [3,16,0,0,-217.5,-2.5,0,182.5,-36,0,180],
// 3 16 -196.4801 0 -145.35 -204.445 0 -145.124 -198.9801 0 -149.6801
  [3,16,-196.4801,0,-145.35,-204.445,0,-145.124,-198.9801,0,-149.6801],
// 3 16 -204.445 0 -145.124 -196.4801 0 -145.35 -193.9801 0 -141.0199
  [3,16,-204.445,0,-145.124,-196.4801,0,-145.35,-193.9801,0,-141.0199],
];
module ldraw_lib__s__32939s02(step=0, col=false, unit=2/5, alt=false, line=0.2, solid=!$preview)
    makepoly(ldraw_lib__s__32939s02(), step=step, col=col, unit=unit, alt=alt, line=line, solid=solid);
ldraw_lib__s__32939s02(line=0.2);
// file: ../p/4-4ndis.scad
use <../lib.scad>
function ldraw_lib__4_4ndis() = [
// 0 Disc Negative 1.0
// 0 Name: 4-4ndis.dat
// 0 Author: James Jessiman
// 0 !LDRAW_ORG Primitive UPDATE 2012-01
// 0 !LICENSE Licensed under CC BY 4.0 : see CAreadme.txt
// 
// 0 BFC CERTIFY CCW
  [0,"BFC","CERTIFY"],
  [0,"BFC","CCW"],
// 
// 0 !HISTORY 2002-03-23 [sbliss] Added BFC statement; compacted code
// 0 !HISTORY 2002-04-25 [PTadmin] Official Update 2002-02
// 0 !HISTORY 2007-06-24 [PTadmin] Header formatted for Contributor Agreement
// 0 !HISTORY 2008-07-01 [PTadmin] Official Update 2008-01
// 0 !HISTORY 2012-02-16 [Philo] Changed to CCW
// 0 !HISTORY 2012-03-30 [PTadmin] Official Update 2012-01
// 
// 
// 3 16 0.9239 0 0.3827 1 0 0 1 0 1
  [3,16,0.9239,0,0.3827,1,0,0,1,0,1],
// 3 16 0.7071 0 0.7071 0.9239 0 0.3827 1 0 1
  [3,16,0.7071,0,0.7071,0.9239,0,0.3827,1,0,1],
// 3 16 0.3827 0 0.9239 0.7071 0 0.7071 1 0 1
  [3,16,0.3827,0,0.9239,0.7071,0,0.7071,1,0,1],
// 3 16 0 0 1 0.3827 0 0.9239 1 0 1
  [3,16,0,0,1,0.3827,0,0.9239,1,0,1],
// 3 16 -0.3827 0 0.9239 0 0 1 -1 0 1
  [3,16,-0.3827,0,0.9239,0,0,1,-1,0,1],
// 3 16 -0.7071 0 0.7071 -0.3827 0 0.9239 -1 0 1
  [3,16,-0.7071,0,0.7071,-0.3827,0,0.9239,-1,0,1],
// 3 16 -0.9239 0 0.3827 -0.7071 0 0.7071 -1 0 1
  [3,16,-0.9239,0,0.3827,-0.7071,0,0.7071,-1,0,1],
// 3 16 -1 0 0 -0.9239 0 0.3827 -1 0 1
  [3,16,-1,0,0,-0.9239,0,0.3827,-1,0,1],
// 3 16 -0.9239 0 -0.3827 -1 0 0 -1 0 -1
  [3,16,-0.9239,0,-0.3827,-1,0,0,-1,0,-1],
// 3 16 -0.7071 0 -0.7071 -0.9239 0 -0.3827 -1 0 -1
  [3,16,-0.7071,0,-0.7071,-0.9239,0,-0.3827,-1,0,-1],
// 3 16 -0.3827 0 -0.9239 -0.7071 0 -0.7071 -1 0 -1
  [3,16,-0.3827,0,-0.9239,-0.7071,0,-0.7071,-1,0,-1],
// 3 16 0 0 -1 -0.3827 0 -0.9239 -1 0 -1
  [3,16,0,0,-1,-0.3827,0,-0.9239,-1,0,-1],
// 3 16 0.3827 0 -0.9239 0 0 -1 1 0 -1
  [3,16,0.3827,0,-0.9239,0,0,-1,1,0,-1],
// 3 16 0.7071 0 -0.7071 0.3827 0 -0.9239 1 0 -1
  [3,16,0.7071,0,-0.7071,0.3827,0,-0.9239,1,0,-1],
// 3 16 0.9239 0 -0.3827 0.7071 0 -0.7071 1 0 -1
  [3,16,0.9239,0,-0.3827,0.7071,0,-0.7071,1,0,-1],
// 3 16 1 0 0 0.9239 0 -0.3827 1 0 -1
  [3,16,1,0,0,0.9239,0,-0.3827,1,0,-1],
];
module ldraw_lib__4_4ndis(step=0, col=false, unit=2/5, alt=false, line=0.2, solid=!$preview)
    makepoly(ldraw_lib__4_4ndis(), step=step, col=col, unit=unit, alt=alt, line=line, solid=solid);
ldraw_lib__4_4ndis(line=0.2);
// file: ../p/4-4cylo.scad
use <../lib.scad>
use <4-4cyli.scad>
use <4-4edge.scad>
function ldraw_lib__4_4cylo() = [
// 0 Cylinder Open 1.0
// 0 Name: 4-4cylo.dat
// 0 Author: Mark Kennedy [mkennedy]
// 0 !LDRAW_ORG Primitive UPDATE 2010-01
// 0 !LICENSE Licensed under CC BY 4.0 : see CAreadme.txt
// 
// 0 BFC CERTIFY CCW
  [0,"BFC","CERTIFY"],
  [0,"BFC","CCW"],
// 
// 0 !HISTORY 2010-04-05 [PTadmin] Official Update 2010-01
// 
// 
// 1 16 0 0 0 1 0 0 0 1 0 0 0 1 4-4edge.dat
  [1,16,0,0,0,1,0,0,0,1,0,0,0,1, ldraw_lib__4_4edge()],
// 1 16 0 1 0 1 0 0 0 1 0 0 0 1 4-4edge.dat
  [1,16,0,1,0,1,0,0,0,1,0,0,0,1, ldraw_lib__4_4edge()],
// 1 16 0 0 0 1 0 0 0 1 0 0 0 1 4-4cyli.dat
  [1,16,0,0,0,1,0,0,0,1,0,0,0,1, ldraw_lib__4_4cyli()],
// 0
];
module ldraw_lib__4_4cylo(step=0, col=false, unit=2/5, alt=false, line=0.2, solid=!$preview)
    makepoly(ldraw_lib__4_4cylo(), step=step, col=col, unit=unit, alt=alt, line=line, solid=solid);
ldraw_lib__4_4cylo(line=0.2);
// main file
use <../lib.scad>
use <../p/4-4cylo.scad>
use <../p/4-4ndis.scad>
use <s/32939s01.scad>
use <s/32939s02.scad>
function ldraw_lib__32939() = [
// 0 Sheet Fabric Triangular 21.8 x 20.7 with Curved Sides and  3 Holes
// 0 Name: 32939.dat
// 0 Author: Evert-Jan Boer [ejboer]
// 0 !LDRAW_ORG Part UPDATE 2026-09
// 0 !LICENSE Licensed under CC BY 4.0 : see CAreadme.txt
// 
// 0 BFC CERTIFY CCW
  [0,"BFC","CERTIFY"],
  [0,"BFC","CCW"],
// 
// 0 !CATEGORY Sheet Fabric
// 0 !KEYWORDS Brickowl 879318, Carousel, Fairground, Set 10257
// 
// 0 !HISTORY 2026-09-30 [OrionP] Official Update 2026-09
// 
// 0 // Top holes
// 1 16 0 -.5 199.2 4.533 0 0 0 1 0 0 0 4.533 4-4ndis.dat
  [1,16,0,-.5,199.2,4.533,0,0,0,1,0,0,0,4.533, ldraw_lib__4_4ndis()],
// 1 16 0 0 199.2 4.533 0 0 0 -1 0 0 0 4.533 4-4ndis.dat
  [1,16,0,0,199.2,4.533,0,0,0,-1,0,0,0,4.533, ldraw_lib__4_4ndis()],
// 0 BFC INVERTNEXT
  [0,"BFC","INVERTNEXT"],
// 1 16 0 -.5 199.2 4.533 0 0 0 .5 0 0 0 4.533 4-4cylo.dat
  [1,16,0,-.5,199.2,4.533,0,0,0,.5,0,0,0,4.533, ldraw_lib__4_4cylo()],
// 
// 1 16 0 -.5 185 2.5 0 0 0 1 0 0 0 2.5 4-4ndis.dat
  [1,16,0,-.5,185,2.5,0,0,0,1,0,0,0,2.5, ldraw_lib__4_4ndis()],
// 1 16 0 0 185 2.5 0 0 0 -1 0 0 0 2.5 4-4ndis.dat
  [1,16,0,0,185,2.5,0,0,0,-1,0,0,0,2.5, ldraw_lib__4_4ndis()],
// 0 BFC INVERTNEXT
  [0,"BFC","INVERTNEXT"],
// 1 16 0 -.5 185 2.5 0 0 0 .5 0 0 0 2.5 4-4cylo.dat
  [1,16,0,-.5,185,2.5,0,0,0,.5,0,0,0,2.5, ldraw_lib__4_4cylo()],
// 
// 2 24 0 0 187.5 0 0 194.667
  [2,24,0,0,187.5,0,0,194.667],
// 2 24 0 -.5 187.5 0 -.5 194.667
  [2,24,0,-.5,187.5,0,-.5,194.667],
// 
// 0 // Bottom
// 1 16 0 0 0 1 0 0 0 1 0 0 0 1 s\32939s01.dat
  [1,16,0,0,0,1,0,0,0,1,0,0,0,1, ldraw_lib__s__32939s01()],
// 1 16 0 0 0 -1 0 0 0 1 0 0 0 1 s\32939s01.dat
  [1,16,0,0,0,-1,0,0,0,1,0,0,0,1, ldraw_lib__s__32939s01()],
// 0 // Top
// 1 16 0 -.5 0 1 0 0 0 1 0 0 0 1 s\32939s02.dat
  [1,16,0,-.5,0,1,0,0,0,1,0,0,0,1, ldraw_lib__s__32939s02()],
// 1 16 0 -.5 0 -1 0 0 0 1 0 0 0 1 s\32939s02.dat
  [1,16,0,-.5,0,-1,0,0,0,1,0,0,0,1, ldraw_lib__s__32939s02()],
];
module ldraw_lib__32939(step=0, col=false, unit=2/5, alt=false, line=0.2, solid=!$preview)
    makepoly(ldraw_lib__32939(), step=step, col=col, unit=unit, alt=alt, line=line, solid=solid);
ldraw_lib__32939(line=0.2);
